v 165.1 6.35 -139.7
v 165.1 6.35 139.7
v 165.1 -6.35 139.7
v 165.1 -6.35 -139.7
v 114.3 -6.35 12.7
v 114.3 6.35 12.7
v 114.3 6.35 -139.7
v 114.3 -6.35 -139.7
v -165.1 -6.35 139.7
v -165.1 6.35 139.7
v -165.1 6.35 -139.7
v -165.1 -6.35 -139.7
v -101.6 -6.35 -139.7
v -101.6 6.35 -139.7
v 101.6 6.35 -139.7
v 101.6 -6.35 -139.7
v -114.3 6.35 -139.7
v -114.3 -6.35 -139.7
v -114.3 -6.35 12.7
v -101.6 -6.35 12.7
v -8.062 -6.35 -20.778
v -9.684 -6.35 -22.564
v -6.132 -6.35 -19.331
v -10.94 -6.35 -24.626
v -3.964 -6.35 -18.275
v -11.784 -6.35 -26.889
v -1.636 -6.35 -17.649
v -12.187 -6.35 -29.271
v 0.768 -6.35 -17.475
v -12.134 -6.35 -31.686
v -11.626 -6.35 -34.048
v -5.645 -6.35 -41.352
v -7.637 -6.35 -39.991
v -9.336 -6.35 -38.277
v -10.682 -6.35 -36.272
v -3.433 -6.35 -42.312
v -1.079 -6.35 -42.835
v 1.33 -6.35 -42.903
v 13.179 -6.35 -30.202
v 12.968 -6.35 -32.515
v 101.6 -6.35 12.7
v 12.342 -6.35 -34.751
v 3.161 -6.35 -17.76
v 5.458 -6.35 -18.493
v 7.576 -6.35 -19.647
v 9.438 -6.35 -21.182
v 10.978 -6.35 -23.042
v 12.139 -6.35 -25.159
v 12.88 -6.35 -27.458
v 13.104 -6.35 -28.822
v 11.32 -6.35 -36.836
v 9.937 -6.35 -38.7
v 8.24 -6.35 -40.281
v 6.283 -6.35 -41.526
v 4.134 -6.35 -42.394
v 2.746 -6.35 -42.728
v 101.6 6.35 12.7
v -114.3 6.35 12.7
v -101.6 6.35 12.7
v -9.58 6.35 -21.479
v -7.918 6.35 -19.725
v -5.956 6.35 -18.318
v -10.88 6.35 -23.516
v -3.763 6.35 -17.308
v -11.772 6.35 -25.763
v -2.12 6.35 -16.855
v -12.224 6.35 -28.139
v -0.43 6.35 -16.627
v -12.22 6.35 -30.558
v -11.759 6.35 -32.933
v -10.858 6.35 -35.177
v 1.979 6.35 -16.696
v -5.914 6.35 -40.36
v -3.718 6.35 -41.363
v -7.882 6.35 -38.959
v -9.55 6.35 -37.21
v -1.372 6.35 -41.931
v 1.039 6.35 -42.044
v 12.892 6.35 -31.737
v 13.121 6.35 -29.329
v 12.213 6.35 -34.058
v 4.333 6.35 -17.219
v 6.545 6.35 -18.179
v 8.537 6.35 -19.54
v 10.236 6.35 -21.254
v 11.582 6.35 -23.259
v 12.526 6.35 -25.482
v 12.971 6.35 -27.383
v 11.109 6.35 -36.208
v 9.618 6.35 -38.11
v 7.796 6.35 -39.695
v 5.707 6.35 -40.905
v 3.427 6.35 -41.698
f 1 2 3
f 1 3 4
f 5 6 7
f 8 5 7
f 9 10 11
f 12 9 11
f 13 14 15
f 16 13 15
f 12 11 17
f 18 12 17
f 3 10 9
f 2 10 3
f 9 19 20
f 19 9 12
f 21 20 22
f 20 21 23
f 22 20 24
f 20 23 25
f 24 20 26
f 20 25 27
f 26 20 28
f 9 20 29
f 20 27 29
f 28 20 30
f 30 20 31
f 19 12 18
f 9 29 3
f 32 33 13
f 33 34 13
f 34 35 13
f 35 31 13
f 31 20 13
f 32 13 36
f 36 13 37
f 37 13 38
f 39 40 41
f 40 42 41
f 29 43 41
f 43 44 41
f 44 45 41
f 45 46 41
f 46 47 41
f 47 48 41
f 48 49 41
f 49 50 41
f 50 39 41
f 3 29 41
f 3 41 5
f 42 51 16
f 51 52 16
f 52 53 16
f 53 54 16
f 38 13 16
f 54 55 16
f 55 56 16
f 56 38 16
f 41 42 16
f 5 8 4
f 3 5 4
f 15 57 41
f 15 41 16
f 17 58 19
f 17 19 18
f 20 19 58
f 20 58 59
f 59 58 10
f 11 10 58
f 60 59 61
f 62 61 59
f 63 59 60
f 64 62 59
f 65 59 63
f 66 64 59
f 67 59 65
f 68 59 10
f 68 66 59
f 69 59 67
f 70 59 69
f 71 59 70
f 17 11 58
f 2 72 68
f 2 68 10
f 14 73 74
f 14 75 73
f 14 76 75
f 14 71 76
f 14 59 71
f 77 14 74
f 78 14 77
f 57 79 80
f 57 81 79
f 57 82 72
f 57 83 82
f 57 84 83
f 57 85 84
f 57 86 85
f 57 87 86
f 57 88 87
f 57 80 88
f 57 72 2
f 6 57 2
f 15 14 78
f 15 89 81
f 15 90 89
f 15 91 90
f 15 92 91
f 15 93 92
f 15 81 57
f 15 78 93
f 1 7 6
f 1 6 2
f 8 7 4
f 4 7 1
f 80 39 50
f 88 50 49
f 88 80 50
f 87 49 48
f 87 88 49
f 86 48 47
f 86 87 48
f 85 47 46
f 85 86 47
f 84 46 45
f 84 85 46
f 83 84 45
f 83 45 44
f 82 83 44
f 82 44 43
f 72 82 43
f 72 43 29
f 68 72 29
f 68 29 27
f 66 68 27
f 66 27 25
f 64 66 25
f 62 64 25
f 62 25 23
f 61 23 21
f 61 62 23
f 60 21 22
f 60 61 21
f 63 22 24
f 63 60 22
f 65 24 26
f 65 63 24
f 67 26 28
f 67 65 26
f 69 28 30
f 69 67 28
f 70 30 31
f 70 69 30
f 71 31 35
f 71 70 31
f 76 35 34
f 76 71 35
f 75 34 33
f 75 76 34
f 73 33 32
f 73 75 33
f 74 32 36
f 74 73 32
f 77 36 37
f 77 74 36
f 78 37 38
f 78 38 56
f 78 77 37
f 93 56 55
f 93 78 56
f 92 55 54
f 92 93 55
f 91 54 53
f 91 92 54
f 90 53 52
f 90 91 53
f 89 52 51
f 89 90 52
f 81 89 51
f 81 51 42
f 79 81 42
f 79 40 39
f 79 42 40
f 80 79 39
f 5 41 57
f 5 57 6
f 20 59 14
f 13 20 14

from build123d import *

# Parameters (mm, degrees)
SKETCH1_W           = 330.2
SKETCH1_H           = 279.4
BOSS_EXTRUDE1_DEPTH = 6.35
SKETCH2_W           = 12.7
SKETCH2_H           = 152.4
CUT_EXTRUDE1_DEPTH  = 217.645770787
CAVITY1_START       = -5.196816792
CAVITY1_OUTLINE_R   = 12.7
CAVITY1_DEPTH       = 14.479849691


# Read off the part's stored shape, not the designer's step: Cavity1
with BuildPart() as part:
    # Sketch1 → Boss-Extrude1 (new, symmetric)
    with BuildSketch(Plane(origin=(0, 0, 0), x_dir=(1, 0, 0), z_dir=(0, 1, 0))):
        Rectangle(SKETCH1_W, SKETCH1_H)
    extrude(amount=BOSS_EXTRUDE1_DEPTH, both=True)

    # Sketch2 → Cut-Extrude1 (cut, through all)
    with BuildSketch(Plane(origin=(0, 6.35, 0), x_dir=(1, 0, 0), z_dir=(0, 1, 0))):
        with Locations((-107.95, 63.5)):
            Rectangle(SKETCH2_W, SKETCH2_H)
        with Locations((107.95, 63.5)):
            Rectangle(SKETCH2_W, SKETCH2_H)
    extrude(amount=-CUT_EXTRUDE1_DEPTH, mode=Mode.SUBTRACT)

    # Cavity1 outline → Cavity1 (cut)
    with BuildSketch(Plane(origin=(0, 0, 0), x_dir=(0.9999894493458413, 0.00458279136333027, 0.00031499257366167274), z_dir=(0.004593603922986451, -0.9976356448477001, -0.06857126900030612)).offset(CAVITY1_START)):
        with Locations((0.440476058, -29.695196787)):
            Circle(CAVITY1_OUTLINE_R)
    extrude(amount=CAVITY1_DEPTH, mode=Mode.SUBTRACT)


solid = part.part
